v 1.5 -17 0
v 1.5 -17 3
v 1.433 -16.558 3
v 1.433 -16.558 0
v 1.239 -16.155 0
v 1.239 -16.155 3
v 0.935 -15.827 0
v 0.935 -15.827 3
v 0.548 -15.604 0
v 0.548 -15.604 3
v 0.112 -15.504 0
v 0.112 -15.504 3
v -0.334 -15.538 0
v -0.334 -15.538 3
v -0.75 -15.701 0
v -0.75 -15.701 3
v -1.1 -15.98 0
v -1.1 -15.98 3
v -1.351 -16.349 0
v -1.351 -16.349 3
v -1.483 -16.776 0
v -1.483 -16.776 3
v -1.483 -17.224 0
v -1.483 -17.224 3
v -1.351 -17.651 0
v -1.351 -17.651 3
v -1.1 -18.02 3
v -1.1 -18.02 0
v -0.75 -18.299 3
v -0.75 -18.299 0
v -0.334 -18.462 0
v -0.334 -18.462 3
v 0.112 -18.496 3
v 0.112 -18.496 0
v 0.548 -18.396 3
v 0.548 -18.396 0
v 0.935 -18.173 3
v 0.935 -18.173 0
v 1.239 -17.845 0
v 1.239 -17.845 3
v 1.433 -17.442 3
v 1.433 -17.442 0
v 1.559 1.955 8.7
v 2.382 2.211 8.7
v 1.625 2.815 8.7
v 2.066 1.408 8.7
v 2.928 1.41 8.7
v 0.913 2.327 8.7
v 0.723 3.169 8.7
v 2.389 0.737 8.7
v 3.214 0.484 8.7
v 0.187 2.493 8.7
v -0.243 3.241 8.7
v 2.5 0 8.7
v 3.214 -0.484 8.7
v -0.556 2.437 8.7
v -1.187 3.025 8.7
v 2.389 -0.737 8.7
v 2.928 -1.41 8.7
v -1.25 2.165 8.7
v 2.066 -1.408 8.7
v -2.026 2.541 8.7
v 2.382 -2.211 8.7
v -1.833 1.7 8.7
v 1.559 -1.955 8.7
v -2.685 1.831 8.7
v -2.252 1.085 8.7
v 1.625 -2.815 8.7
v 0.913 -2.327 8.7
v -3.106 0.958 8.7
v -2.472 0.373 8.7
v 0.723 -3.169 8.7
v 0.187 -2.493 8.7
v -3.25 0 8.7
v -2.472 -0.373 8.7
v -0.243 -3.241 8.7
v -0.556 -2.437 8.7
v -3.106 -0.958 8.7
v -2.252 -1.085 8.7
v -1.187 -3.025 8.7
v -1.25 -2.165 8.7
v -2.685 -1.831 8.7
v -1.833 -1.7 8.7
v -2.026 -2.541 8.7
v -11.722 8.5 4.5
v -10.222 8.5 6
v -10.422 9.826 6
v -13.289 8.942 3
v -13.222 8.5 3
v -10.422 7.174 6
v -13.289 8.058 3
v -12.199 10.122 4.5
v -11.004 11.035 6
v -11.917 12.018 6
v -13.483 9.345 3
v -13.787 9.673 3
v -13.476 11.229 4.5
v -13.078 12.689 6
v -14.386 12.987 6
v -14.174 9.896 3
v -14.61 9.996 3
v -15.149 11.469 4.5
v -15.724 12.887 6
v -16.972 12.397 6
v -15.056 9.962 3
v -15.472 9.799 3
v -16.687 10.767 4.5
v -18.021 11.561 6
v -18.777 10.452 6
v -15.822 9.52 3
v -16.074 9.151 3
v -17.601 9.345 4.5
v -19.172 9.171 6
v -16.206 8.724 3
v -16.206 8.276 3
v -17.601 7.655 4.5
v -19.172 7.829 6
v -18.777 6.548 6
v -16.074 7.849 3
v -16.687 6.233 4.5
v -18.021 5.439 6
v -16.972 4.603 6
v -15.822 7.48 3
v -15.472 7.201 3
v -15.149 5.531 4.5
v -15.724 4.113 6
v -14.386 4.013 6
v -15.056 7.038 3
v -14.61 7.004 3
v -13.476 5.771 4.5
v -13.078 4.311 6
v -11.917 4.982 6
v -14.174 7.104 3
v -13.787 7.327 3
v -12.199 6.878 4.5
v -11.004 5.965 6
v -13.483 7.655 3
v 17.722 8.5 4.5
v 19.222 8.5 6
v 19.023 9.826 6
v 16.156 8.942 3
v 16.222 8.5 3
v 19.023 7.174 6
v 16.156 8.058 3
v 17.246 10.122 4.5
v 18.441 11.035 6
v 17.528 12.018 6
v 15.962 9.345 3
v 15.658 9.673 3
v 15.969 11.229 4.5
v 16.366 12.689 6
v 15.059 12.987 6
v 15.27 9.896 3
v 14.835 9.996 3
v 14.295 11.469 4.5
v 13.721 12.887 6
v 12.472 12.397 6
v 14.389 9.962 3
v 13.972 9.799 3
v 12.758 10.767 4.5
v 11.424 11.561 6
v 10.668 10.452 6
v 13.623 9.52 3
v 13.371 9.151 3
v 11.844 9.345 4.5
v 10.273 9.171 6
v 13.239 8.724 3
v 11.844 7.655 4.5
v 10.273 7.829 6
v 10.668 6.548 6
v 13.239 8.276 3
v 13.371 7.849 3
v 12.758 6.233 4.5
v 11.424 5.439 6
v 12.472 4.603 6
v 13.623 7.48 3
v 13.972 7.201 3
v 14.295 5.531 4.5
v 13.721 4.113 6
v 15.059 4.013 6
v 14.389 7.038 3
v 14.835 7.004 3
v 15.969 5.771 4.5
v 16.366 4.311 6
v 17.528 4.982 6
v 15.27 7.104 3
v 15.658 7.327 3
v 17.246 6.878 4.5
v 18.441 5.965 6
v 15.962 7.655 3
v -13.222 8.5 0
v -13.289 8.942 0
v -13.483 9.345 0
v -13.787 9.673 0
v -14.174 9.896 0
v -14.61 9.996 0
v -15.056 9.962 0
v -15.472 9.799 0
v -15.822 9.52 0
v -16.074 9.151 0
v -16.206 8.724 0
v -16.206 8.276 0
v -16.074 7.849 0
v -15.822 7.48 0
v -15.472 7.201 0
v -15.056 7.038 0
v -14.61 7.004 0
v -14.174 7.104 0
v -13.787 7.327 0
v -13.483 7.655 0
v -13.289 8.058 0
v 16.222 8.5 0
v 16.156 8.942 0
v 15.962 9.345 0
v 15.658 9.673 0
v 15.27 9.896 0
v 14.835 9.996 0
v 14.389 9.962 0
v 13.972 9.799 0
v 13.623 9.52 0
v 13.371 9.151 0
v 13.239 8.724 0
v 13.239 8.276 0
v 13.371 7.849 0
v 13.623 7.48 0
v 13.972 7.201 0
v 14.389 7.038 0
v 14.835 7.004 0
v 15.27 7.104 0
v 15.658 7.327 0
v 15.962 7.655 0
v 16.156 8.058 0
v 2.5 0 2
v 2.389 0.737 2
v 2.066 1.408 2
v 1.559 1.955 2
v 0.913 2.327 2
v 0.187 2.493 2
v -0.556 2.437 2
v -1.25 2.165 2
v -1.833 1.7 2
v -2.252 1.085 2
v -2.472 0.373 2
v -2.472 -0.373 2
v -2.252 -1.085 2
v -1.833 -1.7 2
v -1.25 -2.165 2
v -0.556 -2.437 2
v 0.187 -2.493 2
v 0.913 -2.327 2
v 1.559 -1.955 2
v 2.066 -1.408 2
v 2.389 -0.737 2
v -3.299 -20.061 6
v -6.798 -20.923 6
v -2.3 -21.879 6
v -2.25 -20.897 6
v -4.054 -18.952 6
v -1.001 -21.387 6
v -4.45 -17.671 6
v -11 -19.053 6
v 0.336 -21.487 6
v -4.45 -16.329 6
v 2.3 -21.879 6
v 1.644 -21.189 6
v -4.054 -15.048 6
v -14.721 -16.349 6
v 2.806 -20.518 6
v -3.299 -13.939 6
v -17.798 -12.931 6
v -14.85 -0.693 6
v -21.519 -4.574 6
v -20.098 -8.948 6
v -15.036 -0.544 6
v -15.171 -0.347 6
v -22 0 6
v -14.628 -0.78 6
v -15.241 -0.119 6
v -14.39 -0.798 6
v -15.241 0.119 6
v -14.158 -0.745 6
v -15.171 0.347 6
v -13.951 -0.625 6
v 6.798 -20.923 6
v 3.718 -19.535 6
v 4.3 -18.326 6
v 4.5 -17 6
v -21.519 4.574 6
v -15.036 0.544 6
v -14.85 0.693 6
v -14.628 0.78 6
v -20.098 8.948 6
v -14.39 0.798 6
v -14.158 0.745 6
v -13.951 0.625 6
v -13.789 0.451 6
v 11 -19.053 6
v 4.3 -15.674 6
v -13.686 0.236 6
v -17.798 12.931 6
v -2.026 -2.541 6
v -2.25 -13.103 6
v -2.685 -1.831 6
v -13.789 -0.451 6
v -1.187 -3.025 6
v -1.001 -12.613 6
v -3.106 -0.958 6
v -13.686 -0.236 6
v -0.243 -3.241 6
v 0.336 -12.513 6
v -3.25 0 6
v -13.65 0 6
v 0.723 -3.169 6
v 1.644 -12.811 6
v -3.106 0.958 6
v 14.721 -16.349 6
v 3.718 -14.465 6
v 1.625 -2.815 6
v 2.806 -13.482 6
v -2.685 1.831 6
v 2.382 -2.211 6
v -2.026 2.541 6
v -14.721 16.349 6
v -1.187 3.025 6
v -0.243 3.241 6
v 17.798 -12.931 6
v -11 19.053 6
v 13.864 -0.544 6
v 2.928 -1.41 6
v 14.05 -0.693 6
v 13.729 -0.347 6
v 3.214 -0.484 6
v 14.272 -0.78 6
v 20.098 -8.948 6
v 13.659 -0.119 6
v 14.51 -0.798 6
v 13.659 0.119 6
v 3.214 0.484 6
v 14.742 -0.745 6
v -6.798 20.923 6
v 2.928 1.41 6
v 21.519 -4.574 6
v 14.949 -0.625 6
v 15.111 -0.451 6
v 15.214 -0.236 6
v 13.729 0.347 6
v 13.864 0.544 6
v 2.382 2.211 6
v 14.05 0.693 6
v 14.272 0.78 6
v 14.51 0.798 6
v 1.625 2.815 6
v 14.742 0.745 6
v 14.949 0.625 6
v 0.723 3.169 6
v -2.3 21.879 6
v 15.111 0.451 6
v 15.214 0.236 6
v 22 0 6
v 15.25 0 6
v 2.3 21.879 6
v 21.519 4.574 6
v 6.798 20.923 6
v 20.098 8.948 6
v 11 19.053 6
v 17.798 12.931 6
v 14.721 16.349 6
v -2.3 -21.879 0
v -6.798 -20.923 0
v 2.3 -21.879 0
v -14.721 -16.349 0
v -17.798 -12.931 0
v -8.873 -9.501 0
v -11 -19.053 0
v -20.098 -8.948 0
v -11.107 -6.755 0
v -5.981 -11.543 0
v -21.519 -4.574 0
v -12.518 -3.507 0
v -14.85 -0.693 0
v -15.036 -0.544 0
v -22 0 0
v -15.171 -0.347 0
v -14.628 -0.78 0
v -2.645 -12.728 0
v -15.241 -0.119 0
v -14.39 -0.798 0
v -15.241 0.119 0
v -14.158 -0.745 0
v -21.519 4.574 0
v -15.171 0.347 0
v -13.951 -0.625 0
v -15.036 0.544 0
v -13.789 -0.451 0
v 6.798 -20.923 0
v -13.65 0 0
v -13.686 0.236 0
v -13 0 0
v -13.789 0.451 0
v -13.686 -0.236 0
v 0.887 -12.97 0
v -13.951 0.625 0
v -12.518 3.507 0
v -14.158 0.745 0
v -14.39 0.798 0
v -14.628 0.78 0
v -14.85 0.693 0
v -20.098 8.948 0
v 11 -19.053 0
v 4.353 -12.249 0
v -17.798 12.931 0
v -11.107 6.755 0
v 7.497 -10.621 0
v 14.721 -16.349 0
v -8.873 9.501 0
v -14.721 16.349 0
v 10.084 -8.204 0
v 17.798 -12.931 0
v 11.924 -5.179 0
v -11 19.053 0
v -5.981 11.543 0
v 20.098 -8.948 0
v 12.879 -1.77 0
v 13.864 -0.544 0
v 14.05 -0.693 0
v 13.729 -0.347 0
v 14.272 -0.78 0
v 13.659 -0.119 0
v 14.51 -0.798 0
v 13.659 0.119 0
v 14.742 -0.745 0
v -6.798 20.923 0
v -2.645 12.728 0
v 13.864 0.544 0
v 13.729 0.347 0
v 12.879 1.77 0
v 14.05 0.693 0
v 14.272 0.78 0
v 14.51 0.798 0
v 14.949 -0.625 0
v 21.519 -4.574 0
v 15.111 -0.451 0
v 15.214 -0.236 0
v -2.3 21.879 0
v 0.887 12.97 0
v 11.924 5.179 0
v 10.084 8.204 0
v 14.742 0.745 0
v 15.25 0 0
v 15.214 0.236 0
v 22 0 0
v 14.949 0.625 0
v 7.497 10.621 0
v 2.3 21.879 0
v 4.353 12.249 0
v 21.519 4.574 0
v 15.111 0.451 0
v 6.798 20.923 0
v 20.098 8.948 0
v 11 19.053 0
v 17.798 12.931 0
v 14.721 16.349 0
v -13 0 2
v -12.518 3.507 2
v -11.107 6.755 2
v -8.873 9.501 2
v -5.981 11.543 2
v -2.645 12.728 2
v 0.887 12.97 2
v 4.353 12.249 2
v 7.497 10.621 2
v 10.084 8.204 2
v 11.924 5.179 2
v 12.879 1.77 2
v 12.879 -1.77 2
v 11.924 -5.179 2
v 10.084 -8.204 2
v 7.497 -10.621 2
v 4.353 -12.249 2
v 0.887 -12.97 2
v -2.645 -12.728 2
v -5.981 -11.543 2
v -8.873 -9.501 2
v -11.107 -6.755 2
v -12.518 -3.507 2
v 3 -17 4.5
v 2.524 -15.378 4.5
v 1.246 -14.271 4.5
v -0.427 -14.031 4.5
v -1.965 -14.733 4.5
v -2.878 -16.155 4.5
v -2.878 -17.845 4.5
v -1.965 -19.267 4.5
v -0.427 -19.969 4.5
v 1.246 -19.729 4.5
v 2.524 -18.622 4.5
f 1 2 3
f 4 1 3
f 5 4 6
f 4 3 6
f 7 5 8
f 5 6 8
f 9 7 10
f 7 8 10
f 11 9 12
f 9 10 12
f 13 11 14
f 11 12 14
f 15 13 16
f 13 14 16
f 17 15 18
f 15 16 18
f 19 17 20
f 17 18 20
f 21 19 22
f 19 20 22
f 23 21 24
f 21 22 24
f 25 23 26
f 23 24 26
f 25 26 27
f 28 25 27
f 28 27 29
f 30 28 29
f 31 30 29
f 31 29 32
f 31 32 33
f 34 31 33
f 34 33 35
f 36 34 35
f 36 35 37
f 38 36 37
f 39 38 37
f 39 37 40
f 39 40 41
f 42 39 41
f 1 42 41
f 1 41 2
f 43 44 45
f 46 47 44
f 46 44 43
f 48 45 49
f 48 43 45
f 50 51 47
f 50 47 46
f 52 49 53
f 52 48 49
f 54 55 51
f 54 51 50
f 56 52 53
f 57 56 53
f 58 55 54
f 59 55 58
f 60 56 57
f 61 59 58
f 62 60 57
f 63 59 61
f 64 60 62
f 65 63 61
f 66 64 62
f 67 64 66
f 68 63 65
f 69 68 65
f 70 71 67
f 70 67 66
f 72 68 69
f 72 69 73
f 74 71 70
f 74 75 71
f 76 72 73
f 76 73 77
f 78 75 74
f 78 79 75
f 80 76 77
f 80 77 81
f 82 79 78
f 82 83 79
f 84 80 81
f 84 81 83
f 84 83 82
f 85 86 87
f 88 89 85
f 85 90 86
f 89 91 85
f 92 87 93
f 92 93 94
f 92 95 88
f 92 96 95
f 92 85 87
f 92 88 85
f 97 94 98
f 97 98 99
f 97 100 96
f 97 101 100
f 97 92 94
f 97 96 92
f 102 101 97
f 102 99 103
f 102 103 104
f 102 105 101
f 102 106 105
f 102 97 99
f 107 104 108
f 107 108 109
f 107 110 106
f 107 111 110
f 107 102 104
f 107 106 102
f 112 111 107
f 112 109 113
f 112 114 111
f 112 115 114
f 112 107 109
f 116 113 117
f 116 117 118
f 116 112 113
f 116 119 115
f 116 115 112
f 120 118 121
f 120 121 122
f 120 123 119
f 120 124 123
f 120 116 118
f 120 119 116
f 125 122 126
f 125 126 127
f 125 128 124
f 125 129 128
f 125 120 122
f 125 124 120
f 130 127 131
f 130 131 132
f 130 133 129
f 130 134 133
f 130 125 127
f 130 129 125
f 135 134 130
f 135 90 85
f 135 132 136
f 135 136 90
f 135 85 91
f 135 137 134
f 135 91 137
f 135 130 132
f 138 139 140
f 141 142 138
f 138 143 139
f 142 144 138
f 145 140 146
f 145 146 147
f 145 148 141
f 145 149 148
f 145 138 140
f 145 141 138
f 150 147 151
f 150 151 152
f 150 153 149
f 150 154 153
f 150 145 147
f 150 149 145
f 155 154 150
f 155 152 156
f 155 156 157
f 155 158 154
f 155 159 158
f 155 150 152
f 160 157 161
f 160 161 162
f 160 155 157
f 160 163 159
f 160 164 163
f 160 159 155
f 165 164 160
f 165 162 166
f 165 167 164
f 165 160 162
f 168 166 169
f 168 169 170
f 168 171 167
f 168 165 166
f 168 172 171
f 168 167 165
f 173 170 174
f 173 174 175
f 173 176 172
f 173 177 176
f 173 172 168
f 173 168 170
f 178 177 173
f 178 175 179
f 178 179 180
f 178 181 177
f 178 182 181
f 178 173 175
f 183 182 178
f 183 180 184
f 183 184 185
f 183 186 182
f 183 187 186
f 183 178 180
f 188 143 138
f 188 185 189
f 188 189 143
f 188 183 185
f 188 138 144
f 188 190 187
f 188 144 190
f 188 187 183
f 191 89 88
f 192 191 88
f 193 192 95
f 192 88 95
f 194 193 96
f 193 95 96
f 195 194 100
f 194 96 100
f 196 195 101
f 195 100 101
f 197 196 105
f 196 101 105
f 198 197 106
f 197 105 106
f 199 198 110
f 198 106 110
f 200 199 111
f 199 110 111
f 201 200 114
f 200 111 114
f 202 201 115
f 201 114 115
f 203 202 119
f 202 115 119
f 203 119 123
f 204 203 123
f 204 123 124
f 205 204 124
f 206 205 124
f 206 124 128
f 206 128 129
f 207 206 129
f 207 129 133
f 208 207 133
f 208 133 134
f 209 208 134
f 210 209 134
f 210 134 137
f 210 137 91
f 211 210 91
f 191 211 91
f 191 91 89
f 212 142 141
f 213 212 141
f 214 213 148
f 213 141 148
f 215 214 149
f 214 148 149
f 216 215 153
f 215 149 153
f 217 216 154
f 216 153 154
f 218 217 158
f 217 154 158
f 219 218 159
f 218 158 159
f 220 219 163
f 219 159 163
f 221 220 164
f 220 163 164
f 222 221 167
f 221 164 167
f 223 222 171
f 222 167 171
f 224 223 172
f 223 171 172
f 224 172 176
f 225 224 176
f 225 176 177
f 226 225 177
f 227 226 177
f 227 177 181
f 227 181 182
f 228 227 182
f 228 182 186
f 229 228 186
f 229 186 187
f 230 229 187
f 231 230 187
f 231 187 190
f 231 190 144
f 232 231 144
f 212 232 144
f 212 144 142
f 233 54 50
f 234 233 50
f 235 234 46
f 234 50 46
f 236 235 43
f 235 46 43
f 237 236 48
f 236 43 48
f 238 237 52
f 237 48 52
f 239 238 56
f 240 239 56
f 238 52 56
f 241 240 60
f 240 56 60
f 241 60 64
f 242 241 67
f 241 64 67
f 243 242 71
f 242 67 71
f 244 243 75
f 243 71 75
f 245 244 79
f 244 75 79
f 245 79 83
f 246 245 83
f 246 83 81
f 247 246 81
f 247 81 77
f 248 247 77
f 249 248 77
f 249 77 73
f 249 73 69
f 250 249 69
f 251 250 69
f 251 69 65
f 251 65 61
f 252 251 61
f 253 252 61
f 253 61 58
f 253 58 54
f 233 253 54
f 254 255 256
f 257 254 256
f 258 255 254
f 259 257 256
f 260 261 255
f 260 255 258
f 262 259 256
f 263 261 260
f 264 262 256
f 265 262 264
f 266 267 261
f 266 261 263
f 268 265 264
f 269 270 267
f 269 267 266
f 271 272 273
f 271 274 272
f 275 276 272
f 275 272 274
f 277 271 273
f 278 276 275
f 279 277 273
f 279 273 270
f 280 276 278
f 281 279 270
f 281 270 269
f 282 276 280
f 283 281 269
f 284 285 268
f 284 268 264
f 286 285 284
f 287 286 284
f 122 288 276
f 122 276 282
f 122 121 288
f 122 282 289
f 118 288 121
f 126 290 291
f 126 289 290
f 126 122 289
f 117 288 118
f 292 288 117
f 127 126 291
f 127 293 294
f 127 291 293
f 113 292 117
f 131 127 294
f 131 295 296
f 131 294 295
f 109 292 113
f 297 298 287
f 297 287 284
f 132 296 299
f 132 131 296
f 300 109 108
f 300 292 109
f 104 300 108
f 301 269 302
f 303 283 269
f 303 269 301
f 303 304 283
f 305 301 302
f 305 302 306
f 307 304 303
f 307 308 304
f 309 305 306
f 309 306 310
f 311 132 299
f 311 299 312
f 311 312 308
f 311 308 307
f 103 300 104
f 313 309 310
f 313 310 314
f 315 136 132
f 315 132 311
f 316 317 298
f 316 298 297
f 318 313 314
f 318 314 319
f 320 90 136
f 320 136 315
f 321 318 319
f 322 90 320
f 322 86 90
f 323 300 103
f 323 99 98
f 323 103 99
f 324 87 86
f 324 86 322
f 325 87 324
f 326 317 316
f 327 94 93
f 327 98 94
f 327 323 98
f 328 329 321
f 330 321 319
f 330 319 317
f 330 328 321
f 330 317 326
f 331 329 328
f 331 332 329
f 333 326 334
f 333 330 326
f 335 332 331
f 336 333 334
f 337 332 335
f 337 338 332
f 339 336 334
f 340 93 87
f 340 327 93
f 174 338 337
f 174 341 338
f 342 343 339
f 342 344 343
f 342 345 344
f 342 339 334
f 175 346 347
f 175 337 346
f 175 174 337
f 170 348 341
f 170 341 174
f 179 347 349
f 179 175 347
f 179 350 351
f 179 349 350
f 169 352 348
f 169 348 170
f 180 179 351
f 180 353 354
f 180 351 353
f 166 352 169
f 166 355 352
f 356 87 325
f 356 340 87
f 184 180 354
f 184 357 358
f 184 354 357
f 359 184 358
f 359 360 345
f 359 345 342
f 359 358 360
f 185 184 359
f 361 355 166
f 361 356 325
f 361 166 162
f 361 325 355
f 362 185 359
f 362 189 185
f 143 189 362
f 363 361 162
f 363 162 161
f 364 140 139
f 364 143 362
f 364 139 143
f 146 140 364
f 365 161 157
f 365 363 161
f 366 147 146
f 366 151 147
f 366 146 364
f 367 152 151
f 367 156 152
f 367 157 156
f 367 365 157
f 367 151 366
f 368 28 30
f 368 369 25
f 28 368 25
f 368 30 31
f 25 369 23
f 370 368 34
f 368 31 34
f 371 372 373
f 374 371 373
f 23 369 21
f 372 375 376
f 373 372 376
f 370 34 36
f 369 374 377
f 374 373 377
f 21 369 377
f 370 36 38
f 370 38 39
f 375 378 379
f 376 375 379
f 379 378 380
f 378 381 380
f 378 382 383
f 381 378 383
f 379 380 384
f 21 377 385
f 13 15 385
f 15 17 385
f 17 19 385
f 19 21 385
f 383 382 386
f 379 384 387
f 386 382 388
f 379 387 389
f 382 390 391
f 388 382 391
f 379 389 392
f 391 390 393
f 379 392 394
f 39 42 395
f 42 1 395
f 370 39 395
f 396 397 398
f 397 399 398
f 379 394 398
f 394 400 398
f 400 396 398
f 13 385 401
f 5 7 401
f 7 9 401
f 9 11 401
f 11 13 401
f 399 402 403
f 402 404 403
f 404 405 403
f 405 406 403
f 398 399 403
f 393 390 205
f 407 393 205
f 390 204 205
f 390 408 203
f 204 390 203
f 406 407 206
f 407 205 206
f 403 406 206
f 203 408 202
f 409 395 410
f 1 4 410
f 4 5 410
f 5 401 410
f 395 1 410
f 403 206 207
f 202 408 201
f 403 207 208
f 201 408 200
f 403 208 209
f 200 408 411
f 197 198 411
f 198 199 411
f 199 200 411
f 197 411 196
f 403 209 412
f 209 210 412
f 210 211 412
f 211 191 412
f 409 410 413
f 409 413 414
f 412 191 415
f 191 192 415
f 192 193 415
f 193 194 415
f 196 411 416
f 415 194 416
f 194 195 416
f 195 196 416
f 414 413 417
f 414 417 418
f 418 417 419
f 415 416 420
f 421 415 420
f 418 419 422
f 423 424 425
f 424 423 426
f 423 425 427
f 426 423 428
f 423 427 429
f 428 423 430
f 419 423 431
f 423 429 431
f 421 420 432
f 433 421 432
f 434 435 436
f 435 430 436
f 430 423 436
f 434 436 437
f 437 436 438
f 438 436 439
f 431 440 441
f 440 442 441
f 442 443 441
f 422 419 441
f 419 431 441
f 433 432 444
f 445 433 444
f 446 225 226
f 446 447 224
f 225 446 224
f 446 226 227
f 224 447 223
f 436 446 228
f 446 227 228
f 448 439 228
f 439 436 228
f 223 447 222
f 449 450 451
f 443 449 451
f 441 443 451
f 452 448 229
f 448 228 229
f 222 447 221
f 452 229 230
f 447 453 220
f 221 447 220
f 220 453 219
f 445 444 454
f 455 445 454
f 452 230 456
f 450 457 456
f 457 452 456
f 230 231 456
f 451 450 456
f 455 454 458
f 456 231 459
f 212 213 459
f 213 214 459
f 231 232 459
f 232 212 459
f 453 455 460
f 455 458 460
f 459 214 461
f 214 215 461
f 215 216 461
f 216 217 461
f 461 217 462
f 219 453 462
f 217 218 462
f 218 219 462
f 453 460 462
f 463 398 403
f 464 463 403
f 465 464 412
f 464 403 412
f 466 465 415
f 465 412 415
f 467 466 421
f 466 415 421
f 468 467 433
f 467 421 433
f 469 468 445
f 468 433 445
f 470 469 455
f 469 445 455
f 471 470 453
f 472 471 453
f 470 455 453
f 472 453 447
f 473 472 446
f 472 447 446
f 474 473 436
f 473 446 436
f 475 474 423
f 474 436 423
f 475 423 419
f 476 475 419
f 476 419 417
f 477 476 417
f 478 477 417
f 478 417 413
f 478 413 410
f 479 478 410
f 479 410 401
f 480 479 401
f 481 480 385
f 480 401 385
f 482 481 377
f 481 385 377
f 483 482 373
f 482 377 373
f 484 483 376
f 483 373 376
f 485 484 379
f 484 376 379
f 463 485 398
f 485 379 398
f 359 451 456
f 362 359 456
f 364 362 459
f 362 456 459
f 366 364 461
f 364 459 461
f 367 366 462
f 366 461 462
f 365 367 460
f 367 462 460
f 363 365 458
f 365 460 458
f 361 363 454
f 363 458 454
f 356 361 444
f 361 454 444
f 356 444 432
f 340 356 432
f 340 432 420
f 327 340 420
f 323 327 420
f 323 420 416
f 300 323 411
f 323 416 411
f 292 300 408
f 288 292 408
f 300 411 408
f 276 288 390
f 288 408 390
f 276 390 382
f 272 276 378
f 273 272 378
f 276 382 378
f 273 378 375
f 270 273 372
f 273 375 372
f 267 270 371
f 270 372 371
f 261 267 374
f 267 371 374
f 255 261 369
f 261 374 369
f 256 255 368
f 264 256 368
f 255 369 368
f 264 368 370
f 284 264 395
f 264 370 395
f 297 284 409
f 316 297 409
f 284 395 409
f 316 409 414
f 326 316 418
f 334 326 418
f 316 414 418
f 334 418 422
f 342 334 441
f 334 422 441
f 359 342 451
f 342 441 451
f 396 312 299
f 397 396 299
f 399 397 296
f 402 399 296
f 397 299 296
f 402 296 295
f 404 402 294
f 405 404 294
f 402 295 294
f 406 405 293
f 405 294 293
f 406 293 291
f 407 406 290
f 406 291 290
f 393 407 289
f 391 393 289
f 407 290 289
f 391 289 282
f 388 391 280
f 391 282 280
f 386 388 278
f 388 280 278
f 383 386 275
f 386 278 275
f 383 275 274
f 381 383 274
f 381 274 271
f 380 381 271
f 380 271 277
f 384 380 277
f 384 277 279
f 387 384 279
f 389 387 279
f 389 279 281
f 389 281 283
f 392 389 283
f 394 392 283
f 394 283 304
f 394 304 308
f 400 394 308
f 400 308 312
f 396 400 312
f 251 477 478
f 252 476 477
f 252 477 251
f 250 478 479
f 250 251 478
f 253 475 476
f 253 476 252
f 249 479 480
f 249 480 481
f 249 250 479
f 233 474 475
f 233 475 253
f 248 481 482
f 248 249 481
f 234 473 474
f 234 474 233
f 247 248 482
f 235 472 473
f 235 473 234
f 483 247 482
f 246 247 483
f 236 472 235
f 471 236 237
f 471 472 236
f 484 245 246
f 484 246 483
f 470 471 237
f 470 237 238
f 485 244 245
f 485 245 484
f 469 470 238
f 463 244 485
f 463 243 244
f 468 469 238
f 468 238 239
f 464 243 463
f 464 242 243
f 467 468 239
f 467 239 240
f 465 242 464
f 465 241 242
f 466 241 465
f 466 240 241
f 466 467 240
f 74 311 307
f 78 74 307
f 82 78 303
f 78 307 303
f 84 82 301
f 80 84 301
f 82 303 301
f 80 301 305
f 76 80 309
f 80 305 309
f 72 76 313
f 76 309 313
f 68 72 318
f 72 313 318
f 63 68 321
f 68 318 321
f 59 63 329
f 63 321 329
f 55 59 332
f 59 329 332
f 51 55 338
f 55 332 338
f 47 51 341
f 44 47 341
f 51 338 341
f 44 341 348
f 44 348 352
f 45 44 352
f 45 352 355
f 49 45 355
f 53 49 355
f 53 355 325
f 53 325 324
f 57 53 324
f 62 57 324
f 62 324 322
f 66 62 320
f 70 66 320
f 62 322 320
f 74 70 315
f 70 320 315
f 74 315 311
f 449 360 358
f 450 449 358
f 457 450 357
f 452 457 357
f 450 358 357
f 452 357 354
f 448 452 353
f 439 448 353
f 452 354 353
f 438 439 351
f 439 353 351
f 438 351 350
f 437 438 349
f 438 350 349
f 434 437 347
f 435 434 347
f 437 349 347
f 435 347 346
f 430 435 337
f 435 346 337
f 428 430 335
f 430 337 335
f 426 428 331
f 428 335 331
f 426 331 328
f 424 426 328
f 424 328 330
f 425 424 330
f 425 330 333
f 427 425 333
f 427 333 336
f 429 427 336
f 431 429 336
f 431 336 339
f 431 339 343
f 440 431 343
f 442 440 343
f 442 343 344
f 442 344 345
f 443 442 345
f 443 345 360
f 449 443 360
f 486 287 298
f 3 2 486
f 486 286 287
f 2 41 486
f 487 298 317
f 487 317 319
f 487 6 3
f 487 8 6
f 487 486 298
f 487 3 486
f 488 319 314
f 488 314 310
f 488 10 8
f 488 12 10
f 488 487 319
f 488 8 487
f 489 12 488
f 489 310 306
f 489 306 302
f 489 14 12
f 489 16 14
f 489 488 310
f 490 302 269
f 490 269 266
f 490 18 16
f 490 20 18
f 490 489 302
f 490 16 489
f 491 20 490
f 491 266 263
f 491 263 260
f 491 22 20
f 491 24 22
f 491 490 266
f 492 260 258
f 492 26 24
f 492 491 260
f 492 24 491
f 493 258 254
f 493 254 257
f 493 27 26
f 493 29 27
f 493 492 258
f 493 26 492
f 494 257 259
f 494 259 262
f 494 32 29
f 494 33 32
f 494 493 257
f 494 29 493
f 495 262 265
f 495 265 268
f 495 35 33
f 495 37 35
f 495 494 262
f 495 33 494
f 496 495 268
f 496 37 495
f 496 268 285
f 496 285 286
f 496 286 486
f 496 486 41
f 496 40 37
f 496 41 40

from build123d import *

# Parameters (mm, degrees)
SKETCH_1_R          = 22
EXTRUDE_1_DEPTH     = 6
SKETCH_2_R          = 3.25
EXTRUDE_2_DEPTH     = 2.7
SKETCH_3_R          = 2.5
CUT_EXTRUDE_1_DEPTH = 33.306191357
SKETCH_4_R          = 0.8
CUT_EXTRUDE_2_DEPTH = 32.685959036
SKETCH_5_R          = 13
CUT_EXTRUDE_3_DEPTH = 2
SKETCH_6_R          = 1.5
CUT_EXTRUDE_4_DEPTH = 32.685959036
CHAMFER_1_SIZE      = 3


with BuildPart() as part:
    # Эскиз1 → Бобышка-Вытянуть1 (new body)
    with BuildSketch(Plane.XY):
        Circle(SKETCH_1_R)
    extrude(amount=EXTRUDE_1_DEPTH)

    # Эскиз2 → Бобышка-Вытянуть2 (add)
    with BuildSketch(Plane.XY.offset(6)):
        with Locations(Location((0, 0, 0), (0, 0, 180))):
            Circle(SKETCH_2_R)
    extrude(amount=EXTRUDE_2_DEPTH)

    # Эскиз3 → Вырез-Вытянуть1 (cut, through all)
    with BuildSketch(Plane.XY.offset(8.7)):
        Circle(SKETCH_3_R)
    extrude(amount=-CUT_EXTRUDE_1_DEPTH, mode=Mode.SUBTRACT)

    # Эскиз4 → Вырез-Вытянуть2 (cut, through all)
    with BuildSketch(Plane.XY.offset(6)):
        with Locations((-14.45, 0)):
            Circle(SKETCH_4_R)
        with Locations((14.45, 0)):
            Circle(SKETCH_4_R)
    extrude(amount=-CUT_EXTRUDE_2_DEPTH, mode=Mode.SUBTRACT)

    # Эскиз5 → Вырез-Вытянуть3 (cut)
    with BuildSketch(Plane(origin=(0, 0, 0), x_dir=(-1, 0, 0), z_dir=(0, 0, -1))):
        Circle(SKETCH_5_R)
    extrude(amount=-CUT_EXTRUDE_3_DEPTH, mode=Mode.SUBTRACT)

    # Эскиз6 → Вырез-Вытянуть4 (cut, through all)
    with BuildSketch(Plane.XY.offset(6)):
        with Locations((0, -17)):
            Circle(SKETCH_6_R)
        with Locations((-14.722431864, 8.5)):
            Circle(SKETCH_6_R)
        with Locations((14.722431864, 8.5)):
            Circle(SKETCH_6_R)
    extrude(amount=-CUT_EXTRUDE_4_DEPTH, mode=Mode.SUBTRACT)

    # Фаска1
    chamfer_1_edges = [part.edges().sort_by_distance(p)[0] for p in [
        (-1.5, -17, 6),
        (-16.222431864, 8.5, 6),
        (13.222431864, 8.5, 6),
    ]]
    chamfer(chamfer_1_edges, length=CHAMFER_1_SIZE)


solid = part.part
